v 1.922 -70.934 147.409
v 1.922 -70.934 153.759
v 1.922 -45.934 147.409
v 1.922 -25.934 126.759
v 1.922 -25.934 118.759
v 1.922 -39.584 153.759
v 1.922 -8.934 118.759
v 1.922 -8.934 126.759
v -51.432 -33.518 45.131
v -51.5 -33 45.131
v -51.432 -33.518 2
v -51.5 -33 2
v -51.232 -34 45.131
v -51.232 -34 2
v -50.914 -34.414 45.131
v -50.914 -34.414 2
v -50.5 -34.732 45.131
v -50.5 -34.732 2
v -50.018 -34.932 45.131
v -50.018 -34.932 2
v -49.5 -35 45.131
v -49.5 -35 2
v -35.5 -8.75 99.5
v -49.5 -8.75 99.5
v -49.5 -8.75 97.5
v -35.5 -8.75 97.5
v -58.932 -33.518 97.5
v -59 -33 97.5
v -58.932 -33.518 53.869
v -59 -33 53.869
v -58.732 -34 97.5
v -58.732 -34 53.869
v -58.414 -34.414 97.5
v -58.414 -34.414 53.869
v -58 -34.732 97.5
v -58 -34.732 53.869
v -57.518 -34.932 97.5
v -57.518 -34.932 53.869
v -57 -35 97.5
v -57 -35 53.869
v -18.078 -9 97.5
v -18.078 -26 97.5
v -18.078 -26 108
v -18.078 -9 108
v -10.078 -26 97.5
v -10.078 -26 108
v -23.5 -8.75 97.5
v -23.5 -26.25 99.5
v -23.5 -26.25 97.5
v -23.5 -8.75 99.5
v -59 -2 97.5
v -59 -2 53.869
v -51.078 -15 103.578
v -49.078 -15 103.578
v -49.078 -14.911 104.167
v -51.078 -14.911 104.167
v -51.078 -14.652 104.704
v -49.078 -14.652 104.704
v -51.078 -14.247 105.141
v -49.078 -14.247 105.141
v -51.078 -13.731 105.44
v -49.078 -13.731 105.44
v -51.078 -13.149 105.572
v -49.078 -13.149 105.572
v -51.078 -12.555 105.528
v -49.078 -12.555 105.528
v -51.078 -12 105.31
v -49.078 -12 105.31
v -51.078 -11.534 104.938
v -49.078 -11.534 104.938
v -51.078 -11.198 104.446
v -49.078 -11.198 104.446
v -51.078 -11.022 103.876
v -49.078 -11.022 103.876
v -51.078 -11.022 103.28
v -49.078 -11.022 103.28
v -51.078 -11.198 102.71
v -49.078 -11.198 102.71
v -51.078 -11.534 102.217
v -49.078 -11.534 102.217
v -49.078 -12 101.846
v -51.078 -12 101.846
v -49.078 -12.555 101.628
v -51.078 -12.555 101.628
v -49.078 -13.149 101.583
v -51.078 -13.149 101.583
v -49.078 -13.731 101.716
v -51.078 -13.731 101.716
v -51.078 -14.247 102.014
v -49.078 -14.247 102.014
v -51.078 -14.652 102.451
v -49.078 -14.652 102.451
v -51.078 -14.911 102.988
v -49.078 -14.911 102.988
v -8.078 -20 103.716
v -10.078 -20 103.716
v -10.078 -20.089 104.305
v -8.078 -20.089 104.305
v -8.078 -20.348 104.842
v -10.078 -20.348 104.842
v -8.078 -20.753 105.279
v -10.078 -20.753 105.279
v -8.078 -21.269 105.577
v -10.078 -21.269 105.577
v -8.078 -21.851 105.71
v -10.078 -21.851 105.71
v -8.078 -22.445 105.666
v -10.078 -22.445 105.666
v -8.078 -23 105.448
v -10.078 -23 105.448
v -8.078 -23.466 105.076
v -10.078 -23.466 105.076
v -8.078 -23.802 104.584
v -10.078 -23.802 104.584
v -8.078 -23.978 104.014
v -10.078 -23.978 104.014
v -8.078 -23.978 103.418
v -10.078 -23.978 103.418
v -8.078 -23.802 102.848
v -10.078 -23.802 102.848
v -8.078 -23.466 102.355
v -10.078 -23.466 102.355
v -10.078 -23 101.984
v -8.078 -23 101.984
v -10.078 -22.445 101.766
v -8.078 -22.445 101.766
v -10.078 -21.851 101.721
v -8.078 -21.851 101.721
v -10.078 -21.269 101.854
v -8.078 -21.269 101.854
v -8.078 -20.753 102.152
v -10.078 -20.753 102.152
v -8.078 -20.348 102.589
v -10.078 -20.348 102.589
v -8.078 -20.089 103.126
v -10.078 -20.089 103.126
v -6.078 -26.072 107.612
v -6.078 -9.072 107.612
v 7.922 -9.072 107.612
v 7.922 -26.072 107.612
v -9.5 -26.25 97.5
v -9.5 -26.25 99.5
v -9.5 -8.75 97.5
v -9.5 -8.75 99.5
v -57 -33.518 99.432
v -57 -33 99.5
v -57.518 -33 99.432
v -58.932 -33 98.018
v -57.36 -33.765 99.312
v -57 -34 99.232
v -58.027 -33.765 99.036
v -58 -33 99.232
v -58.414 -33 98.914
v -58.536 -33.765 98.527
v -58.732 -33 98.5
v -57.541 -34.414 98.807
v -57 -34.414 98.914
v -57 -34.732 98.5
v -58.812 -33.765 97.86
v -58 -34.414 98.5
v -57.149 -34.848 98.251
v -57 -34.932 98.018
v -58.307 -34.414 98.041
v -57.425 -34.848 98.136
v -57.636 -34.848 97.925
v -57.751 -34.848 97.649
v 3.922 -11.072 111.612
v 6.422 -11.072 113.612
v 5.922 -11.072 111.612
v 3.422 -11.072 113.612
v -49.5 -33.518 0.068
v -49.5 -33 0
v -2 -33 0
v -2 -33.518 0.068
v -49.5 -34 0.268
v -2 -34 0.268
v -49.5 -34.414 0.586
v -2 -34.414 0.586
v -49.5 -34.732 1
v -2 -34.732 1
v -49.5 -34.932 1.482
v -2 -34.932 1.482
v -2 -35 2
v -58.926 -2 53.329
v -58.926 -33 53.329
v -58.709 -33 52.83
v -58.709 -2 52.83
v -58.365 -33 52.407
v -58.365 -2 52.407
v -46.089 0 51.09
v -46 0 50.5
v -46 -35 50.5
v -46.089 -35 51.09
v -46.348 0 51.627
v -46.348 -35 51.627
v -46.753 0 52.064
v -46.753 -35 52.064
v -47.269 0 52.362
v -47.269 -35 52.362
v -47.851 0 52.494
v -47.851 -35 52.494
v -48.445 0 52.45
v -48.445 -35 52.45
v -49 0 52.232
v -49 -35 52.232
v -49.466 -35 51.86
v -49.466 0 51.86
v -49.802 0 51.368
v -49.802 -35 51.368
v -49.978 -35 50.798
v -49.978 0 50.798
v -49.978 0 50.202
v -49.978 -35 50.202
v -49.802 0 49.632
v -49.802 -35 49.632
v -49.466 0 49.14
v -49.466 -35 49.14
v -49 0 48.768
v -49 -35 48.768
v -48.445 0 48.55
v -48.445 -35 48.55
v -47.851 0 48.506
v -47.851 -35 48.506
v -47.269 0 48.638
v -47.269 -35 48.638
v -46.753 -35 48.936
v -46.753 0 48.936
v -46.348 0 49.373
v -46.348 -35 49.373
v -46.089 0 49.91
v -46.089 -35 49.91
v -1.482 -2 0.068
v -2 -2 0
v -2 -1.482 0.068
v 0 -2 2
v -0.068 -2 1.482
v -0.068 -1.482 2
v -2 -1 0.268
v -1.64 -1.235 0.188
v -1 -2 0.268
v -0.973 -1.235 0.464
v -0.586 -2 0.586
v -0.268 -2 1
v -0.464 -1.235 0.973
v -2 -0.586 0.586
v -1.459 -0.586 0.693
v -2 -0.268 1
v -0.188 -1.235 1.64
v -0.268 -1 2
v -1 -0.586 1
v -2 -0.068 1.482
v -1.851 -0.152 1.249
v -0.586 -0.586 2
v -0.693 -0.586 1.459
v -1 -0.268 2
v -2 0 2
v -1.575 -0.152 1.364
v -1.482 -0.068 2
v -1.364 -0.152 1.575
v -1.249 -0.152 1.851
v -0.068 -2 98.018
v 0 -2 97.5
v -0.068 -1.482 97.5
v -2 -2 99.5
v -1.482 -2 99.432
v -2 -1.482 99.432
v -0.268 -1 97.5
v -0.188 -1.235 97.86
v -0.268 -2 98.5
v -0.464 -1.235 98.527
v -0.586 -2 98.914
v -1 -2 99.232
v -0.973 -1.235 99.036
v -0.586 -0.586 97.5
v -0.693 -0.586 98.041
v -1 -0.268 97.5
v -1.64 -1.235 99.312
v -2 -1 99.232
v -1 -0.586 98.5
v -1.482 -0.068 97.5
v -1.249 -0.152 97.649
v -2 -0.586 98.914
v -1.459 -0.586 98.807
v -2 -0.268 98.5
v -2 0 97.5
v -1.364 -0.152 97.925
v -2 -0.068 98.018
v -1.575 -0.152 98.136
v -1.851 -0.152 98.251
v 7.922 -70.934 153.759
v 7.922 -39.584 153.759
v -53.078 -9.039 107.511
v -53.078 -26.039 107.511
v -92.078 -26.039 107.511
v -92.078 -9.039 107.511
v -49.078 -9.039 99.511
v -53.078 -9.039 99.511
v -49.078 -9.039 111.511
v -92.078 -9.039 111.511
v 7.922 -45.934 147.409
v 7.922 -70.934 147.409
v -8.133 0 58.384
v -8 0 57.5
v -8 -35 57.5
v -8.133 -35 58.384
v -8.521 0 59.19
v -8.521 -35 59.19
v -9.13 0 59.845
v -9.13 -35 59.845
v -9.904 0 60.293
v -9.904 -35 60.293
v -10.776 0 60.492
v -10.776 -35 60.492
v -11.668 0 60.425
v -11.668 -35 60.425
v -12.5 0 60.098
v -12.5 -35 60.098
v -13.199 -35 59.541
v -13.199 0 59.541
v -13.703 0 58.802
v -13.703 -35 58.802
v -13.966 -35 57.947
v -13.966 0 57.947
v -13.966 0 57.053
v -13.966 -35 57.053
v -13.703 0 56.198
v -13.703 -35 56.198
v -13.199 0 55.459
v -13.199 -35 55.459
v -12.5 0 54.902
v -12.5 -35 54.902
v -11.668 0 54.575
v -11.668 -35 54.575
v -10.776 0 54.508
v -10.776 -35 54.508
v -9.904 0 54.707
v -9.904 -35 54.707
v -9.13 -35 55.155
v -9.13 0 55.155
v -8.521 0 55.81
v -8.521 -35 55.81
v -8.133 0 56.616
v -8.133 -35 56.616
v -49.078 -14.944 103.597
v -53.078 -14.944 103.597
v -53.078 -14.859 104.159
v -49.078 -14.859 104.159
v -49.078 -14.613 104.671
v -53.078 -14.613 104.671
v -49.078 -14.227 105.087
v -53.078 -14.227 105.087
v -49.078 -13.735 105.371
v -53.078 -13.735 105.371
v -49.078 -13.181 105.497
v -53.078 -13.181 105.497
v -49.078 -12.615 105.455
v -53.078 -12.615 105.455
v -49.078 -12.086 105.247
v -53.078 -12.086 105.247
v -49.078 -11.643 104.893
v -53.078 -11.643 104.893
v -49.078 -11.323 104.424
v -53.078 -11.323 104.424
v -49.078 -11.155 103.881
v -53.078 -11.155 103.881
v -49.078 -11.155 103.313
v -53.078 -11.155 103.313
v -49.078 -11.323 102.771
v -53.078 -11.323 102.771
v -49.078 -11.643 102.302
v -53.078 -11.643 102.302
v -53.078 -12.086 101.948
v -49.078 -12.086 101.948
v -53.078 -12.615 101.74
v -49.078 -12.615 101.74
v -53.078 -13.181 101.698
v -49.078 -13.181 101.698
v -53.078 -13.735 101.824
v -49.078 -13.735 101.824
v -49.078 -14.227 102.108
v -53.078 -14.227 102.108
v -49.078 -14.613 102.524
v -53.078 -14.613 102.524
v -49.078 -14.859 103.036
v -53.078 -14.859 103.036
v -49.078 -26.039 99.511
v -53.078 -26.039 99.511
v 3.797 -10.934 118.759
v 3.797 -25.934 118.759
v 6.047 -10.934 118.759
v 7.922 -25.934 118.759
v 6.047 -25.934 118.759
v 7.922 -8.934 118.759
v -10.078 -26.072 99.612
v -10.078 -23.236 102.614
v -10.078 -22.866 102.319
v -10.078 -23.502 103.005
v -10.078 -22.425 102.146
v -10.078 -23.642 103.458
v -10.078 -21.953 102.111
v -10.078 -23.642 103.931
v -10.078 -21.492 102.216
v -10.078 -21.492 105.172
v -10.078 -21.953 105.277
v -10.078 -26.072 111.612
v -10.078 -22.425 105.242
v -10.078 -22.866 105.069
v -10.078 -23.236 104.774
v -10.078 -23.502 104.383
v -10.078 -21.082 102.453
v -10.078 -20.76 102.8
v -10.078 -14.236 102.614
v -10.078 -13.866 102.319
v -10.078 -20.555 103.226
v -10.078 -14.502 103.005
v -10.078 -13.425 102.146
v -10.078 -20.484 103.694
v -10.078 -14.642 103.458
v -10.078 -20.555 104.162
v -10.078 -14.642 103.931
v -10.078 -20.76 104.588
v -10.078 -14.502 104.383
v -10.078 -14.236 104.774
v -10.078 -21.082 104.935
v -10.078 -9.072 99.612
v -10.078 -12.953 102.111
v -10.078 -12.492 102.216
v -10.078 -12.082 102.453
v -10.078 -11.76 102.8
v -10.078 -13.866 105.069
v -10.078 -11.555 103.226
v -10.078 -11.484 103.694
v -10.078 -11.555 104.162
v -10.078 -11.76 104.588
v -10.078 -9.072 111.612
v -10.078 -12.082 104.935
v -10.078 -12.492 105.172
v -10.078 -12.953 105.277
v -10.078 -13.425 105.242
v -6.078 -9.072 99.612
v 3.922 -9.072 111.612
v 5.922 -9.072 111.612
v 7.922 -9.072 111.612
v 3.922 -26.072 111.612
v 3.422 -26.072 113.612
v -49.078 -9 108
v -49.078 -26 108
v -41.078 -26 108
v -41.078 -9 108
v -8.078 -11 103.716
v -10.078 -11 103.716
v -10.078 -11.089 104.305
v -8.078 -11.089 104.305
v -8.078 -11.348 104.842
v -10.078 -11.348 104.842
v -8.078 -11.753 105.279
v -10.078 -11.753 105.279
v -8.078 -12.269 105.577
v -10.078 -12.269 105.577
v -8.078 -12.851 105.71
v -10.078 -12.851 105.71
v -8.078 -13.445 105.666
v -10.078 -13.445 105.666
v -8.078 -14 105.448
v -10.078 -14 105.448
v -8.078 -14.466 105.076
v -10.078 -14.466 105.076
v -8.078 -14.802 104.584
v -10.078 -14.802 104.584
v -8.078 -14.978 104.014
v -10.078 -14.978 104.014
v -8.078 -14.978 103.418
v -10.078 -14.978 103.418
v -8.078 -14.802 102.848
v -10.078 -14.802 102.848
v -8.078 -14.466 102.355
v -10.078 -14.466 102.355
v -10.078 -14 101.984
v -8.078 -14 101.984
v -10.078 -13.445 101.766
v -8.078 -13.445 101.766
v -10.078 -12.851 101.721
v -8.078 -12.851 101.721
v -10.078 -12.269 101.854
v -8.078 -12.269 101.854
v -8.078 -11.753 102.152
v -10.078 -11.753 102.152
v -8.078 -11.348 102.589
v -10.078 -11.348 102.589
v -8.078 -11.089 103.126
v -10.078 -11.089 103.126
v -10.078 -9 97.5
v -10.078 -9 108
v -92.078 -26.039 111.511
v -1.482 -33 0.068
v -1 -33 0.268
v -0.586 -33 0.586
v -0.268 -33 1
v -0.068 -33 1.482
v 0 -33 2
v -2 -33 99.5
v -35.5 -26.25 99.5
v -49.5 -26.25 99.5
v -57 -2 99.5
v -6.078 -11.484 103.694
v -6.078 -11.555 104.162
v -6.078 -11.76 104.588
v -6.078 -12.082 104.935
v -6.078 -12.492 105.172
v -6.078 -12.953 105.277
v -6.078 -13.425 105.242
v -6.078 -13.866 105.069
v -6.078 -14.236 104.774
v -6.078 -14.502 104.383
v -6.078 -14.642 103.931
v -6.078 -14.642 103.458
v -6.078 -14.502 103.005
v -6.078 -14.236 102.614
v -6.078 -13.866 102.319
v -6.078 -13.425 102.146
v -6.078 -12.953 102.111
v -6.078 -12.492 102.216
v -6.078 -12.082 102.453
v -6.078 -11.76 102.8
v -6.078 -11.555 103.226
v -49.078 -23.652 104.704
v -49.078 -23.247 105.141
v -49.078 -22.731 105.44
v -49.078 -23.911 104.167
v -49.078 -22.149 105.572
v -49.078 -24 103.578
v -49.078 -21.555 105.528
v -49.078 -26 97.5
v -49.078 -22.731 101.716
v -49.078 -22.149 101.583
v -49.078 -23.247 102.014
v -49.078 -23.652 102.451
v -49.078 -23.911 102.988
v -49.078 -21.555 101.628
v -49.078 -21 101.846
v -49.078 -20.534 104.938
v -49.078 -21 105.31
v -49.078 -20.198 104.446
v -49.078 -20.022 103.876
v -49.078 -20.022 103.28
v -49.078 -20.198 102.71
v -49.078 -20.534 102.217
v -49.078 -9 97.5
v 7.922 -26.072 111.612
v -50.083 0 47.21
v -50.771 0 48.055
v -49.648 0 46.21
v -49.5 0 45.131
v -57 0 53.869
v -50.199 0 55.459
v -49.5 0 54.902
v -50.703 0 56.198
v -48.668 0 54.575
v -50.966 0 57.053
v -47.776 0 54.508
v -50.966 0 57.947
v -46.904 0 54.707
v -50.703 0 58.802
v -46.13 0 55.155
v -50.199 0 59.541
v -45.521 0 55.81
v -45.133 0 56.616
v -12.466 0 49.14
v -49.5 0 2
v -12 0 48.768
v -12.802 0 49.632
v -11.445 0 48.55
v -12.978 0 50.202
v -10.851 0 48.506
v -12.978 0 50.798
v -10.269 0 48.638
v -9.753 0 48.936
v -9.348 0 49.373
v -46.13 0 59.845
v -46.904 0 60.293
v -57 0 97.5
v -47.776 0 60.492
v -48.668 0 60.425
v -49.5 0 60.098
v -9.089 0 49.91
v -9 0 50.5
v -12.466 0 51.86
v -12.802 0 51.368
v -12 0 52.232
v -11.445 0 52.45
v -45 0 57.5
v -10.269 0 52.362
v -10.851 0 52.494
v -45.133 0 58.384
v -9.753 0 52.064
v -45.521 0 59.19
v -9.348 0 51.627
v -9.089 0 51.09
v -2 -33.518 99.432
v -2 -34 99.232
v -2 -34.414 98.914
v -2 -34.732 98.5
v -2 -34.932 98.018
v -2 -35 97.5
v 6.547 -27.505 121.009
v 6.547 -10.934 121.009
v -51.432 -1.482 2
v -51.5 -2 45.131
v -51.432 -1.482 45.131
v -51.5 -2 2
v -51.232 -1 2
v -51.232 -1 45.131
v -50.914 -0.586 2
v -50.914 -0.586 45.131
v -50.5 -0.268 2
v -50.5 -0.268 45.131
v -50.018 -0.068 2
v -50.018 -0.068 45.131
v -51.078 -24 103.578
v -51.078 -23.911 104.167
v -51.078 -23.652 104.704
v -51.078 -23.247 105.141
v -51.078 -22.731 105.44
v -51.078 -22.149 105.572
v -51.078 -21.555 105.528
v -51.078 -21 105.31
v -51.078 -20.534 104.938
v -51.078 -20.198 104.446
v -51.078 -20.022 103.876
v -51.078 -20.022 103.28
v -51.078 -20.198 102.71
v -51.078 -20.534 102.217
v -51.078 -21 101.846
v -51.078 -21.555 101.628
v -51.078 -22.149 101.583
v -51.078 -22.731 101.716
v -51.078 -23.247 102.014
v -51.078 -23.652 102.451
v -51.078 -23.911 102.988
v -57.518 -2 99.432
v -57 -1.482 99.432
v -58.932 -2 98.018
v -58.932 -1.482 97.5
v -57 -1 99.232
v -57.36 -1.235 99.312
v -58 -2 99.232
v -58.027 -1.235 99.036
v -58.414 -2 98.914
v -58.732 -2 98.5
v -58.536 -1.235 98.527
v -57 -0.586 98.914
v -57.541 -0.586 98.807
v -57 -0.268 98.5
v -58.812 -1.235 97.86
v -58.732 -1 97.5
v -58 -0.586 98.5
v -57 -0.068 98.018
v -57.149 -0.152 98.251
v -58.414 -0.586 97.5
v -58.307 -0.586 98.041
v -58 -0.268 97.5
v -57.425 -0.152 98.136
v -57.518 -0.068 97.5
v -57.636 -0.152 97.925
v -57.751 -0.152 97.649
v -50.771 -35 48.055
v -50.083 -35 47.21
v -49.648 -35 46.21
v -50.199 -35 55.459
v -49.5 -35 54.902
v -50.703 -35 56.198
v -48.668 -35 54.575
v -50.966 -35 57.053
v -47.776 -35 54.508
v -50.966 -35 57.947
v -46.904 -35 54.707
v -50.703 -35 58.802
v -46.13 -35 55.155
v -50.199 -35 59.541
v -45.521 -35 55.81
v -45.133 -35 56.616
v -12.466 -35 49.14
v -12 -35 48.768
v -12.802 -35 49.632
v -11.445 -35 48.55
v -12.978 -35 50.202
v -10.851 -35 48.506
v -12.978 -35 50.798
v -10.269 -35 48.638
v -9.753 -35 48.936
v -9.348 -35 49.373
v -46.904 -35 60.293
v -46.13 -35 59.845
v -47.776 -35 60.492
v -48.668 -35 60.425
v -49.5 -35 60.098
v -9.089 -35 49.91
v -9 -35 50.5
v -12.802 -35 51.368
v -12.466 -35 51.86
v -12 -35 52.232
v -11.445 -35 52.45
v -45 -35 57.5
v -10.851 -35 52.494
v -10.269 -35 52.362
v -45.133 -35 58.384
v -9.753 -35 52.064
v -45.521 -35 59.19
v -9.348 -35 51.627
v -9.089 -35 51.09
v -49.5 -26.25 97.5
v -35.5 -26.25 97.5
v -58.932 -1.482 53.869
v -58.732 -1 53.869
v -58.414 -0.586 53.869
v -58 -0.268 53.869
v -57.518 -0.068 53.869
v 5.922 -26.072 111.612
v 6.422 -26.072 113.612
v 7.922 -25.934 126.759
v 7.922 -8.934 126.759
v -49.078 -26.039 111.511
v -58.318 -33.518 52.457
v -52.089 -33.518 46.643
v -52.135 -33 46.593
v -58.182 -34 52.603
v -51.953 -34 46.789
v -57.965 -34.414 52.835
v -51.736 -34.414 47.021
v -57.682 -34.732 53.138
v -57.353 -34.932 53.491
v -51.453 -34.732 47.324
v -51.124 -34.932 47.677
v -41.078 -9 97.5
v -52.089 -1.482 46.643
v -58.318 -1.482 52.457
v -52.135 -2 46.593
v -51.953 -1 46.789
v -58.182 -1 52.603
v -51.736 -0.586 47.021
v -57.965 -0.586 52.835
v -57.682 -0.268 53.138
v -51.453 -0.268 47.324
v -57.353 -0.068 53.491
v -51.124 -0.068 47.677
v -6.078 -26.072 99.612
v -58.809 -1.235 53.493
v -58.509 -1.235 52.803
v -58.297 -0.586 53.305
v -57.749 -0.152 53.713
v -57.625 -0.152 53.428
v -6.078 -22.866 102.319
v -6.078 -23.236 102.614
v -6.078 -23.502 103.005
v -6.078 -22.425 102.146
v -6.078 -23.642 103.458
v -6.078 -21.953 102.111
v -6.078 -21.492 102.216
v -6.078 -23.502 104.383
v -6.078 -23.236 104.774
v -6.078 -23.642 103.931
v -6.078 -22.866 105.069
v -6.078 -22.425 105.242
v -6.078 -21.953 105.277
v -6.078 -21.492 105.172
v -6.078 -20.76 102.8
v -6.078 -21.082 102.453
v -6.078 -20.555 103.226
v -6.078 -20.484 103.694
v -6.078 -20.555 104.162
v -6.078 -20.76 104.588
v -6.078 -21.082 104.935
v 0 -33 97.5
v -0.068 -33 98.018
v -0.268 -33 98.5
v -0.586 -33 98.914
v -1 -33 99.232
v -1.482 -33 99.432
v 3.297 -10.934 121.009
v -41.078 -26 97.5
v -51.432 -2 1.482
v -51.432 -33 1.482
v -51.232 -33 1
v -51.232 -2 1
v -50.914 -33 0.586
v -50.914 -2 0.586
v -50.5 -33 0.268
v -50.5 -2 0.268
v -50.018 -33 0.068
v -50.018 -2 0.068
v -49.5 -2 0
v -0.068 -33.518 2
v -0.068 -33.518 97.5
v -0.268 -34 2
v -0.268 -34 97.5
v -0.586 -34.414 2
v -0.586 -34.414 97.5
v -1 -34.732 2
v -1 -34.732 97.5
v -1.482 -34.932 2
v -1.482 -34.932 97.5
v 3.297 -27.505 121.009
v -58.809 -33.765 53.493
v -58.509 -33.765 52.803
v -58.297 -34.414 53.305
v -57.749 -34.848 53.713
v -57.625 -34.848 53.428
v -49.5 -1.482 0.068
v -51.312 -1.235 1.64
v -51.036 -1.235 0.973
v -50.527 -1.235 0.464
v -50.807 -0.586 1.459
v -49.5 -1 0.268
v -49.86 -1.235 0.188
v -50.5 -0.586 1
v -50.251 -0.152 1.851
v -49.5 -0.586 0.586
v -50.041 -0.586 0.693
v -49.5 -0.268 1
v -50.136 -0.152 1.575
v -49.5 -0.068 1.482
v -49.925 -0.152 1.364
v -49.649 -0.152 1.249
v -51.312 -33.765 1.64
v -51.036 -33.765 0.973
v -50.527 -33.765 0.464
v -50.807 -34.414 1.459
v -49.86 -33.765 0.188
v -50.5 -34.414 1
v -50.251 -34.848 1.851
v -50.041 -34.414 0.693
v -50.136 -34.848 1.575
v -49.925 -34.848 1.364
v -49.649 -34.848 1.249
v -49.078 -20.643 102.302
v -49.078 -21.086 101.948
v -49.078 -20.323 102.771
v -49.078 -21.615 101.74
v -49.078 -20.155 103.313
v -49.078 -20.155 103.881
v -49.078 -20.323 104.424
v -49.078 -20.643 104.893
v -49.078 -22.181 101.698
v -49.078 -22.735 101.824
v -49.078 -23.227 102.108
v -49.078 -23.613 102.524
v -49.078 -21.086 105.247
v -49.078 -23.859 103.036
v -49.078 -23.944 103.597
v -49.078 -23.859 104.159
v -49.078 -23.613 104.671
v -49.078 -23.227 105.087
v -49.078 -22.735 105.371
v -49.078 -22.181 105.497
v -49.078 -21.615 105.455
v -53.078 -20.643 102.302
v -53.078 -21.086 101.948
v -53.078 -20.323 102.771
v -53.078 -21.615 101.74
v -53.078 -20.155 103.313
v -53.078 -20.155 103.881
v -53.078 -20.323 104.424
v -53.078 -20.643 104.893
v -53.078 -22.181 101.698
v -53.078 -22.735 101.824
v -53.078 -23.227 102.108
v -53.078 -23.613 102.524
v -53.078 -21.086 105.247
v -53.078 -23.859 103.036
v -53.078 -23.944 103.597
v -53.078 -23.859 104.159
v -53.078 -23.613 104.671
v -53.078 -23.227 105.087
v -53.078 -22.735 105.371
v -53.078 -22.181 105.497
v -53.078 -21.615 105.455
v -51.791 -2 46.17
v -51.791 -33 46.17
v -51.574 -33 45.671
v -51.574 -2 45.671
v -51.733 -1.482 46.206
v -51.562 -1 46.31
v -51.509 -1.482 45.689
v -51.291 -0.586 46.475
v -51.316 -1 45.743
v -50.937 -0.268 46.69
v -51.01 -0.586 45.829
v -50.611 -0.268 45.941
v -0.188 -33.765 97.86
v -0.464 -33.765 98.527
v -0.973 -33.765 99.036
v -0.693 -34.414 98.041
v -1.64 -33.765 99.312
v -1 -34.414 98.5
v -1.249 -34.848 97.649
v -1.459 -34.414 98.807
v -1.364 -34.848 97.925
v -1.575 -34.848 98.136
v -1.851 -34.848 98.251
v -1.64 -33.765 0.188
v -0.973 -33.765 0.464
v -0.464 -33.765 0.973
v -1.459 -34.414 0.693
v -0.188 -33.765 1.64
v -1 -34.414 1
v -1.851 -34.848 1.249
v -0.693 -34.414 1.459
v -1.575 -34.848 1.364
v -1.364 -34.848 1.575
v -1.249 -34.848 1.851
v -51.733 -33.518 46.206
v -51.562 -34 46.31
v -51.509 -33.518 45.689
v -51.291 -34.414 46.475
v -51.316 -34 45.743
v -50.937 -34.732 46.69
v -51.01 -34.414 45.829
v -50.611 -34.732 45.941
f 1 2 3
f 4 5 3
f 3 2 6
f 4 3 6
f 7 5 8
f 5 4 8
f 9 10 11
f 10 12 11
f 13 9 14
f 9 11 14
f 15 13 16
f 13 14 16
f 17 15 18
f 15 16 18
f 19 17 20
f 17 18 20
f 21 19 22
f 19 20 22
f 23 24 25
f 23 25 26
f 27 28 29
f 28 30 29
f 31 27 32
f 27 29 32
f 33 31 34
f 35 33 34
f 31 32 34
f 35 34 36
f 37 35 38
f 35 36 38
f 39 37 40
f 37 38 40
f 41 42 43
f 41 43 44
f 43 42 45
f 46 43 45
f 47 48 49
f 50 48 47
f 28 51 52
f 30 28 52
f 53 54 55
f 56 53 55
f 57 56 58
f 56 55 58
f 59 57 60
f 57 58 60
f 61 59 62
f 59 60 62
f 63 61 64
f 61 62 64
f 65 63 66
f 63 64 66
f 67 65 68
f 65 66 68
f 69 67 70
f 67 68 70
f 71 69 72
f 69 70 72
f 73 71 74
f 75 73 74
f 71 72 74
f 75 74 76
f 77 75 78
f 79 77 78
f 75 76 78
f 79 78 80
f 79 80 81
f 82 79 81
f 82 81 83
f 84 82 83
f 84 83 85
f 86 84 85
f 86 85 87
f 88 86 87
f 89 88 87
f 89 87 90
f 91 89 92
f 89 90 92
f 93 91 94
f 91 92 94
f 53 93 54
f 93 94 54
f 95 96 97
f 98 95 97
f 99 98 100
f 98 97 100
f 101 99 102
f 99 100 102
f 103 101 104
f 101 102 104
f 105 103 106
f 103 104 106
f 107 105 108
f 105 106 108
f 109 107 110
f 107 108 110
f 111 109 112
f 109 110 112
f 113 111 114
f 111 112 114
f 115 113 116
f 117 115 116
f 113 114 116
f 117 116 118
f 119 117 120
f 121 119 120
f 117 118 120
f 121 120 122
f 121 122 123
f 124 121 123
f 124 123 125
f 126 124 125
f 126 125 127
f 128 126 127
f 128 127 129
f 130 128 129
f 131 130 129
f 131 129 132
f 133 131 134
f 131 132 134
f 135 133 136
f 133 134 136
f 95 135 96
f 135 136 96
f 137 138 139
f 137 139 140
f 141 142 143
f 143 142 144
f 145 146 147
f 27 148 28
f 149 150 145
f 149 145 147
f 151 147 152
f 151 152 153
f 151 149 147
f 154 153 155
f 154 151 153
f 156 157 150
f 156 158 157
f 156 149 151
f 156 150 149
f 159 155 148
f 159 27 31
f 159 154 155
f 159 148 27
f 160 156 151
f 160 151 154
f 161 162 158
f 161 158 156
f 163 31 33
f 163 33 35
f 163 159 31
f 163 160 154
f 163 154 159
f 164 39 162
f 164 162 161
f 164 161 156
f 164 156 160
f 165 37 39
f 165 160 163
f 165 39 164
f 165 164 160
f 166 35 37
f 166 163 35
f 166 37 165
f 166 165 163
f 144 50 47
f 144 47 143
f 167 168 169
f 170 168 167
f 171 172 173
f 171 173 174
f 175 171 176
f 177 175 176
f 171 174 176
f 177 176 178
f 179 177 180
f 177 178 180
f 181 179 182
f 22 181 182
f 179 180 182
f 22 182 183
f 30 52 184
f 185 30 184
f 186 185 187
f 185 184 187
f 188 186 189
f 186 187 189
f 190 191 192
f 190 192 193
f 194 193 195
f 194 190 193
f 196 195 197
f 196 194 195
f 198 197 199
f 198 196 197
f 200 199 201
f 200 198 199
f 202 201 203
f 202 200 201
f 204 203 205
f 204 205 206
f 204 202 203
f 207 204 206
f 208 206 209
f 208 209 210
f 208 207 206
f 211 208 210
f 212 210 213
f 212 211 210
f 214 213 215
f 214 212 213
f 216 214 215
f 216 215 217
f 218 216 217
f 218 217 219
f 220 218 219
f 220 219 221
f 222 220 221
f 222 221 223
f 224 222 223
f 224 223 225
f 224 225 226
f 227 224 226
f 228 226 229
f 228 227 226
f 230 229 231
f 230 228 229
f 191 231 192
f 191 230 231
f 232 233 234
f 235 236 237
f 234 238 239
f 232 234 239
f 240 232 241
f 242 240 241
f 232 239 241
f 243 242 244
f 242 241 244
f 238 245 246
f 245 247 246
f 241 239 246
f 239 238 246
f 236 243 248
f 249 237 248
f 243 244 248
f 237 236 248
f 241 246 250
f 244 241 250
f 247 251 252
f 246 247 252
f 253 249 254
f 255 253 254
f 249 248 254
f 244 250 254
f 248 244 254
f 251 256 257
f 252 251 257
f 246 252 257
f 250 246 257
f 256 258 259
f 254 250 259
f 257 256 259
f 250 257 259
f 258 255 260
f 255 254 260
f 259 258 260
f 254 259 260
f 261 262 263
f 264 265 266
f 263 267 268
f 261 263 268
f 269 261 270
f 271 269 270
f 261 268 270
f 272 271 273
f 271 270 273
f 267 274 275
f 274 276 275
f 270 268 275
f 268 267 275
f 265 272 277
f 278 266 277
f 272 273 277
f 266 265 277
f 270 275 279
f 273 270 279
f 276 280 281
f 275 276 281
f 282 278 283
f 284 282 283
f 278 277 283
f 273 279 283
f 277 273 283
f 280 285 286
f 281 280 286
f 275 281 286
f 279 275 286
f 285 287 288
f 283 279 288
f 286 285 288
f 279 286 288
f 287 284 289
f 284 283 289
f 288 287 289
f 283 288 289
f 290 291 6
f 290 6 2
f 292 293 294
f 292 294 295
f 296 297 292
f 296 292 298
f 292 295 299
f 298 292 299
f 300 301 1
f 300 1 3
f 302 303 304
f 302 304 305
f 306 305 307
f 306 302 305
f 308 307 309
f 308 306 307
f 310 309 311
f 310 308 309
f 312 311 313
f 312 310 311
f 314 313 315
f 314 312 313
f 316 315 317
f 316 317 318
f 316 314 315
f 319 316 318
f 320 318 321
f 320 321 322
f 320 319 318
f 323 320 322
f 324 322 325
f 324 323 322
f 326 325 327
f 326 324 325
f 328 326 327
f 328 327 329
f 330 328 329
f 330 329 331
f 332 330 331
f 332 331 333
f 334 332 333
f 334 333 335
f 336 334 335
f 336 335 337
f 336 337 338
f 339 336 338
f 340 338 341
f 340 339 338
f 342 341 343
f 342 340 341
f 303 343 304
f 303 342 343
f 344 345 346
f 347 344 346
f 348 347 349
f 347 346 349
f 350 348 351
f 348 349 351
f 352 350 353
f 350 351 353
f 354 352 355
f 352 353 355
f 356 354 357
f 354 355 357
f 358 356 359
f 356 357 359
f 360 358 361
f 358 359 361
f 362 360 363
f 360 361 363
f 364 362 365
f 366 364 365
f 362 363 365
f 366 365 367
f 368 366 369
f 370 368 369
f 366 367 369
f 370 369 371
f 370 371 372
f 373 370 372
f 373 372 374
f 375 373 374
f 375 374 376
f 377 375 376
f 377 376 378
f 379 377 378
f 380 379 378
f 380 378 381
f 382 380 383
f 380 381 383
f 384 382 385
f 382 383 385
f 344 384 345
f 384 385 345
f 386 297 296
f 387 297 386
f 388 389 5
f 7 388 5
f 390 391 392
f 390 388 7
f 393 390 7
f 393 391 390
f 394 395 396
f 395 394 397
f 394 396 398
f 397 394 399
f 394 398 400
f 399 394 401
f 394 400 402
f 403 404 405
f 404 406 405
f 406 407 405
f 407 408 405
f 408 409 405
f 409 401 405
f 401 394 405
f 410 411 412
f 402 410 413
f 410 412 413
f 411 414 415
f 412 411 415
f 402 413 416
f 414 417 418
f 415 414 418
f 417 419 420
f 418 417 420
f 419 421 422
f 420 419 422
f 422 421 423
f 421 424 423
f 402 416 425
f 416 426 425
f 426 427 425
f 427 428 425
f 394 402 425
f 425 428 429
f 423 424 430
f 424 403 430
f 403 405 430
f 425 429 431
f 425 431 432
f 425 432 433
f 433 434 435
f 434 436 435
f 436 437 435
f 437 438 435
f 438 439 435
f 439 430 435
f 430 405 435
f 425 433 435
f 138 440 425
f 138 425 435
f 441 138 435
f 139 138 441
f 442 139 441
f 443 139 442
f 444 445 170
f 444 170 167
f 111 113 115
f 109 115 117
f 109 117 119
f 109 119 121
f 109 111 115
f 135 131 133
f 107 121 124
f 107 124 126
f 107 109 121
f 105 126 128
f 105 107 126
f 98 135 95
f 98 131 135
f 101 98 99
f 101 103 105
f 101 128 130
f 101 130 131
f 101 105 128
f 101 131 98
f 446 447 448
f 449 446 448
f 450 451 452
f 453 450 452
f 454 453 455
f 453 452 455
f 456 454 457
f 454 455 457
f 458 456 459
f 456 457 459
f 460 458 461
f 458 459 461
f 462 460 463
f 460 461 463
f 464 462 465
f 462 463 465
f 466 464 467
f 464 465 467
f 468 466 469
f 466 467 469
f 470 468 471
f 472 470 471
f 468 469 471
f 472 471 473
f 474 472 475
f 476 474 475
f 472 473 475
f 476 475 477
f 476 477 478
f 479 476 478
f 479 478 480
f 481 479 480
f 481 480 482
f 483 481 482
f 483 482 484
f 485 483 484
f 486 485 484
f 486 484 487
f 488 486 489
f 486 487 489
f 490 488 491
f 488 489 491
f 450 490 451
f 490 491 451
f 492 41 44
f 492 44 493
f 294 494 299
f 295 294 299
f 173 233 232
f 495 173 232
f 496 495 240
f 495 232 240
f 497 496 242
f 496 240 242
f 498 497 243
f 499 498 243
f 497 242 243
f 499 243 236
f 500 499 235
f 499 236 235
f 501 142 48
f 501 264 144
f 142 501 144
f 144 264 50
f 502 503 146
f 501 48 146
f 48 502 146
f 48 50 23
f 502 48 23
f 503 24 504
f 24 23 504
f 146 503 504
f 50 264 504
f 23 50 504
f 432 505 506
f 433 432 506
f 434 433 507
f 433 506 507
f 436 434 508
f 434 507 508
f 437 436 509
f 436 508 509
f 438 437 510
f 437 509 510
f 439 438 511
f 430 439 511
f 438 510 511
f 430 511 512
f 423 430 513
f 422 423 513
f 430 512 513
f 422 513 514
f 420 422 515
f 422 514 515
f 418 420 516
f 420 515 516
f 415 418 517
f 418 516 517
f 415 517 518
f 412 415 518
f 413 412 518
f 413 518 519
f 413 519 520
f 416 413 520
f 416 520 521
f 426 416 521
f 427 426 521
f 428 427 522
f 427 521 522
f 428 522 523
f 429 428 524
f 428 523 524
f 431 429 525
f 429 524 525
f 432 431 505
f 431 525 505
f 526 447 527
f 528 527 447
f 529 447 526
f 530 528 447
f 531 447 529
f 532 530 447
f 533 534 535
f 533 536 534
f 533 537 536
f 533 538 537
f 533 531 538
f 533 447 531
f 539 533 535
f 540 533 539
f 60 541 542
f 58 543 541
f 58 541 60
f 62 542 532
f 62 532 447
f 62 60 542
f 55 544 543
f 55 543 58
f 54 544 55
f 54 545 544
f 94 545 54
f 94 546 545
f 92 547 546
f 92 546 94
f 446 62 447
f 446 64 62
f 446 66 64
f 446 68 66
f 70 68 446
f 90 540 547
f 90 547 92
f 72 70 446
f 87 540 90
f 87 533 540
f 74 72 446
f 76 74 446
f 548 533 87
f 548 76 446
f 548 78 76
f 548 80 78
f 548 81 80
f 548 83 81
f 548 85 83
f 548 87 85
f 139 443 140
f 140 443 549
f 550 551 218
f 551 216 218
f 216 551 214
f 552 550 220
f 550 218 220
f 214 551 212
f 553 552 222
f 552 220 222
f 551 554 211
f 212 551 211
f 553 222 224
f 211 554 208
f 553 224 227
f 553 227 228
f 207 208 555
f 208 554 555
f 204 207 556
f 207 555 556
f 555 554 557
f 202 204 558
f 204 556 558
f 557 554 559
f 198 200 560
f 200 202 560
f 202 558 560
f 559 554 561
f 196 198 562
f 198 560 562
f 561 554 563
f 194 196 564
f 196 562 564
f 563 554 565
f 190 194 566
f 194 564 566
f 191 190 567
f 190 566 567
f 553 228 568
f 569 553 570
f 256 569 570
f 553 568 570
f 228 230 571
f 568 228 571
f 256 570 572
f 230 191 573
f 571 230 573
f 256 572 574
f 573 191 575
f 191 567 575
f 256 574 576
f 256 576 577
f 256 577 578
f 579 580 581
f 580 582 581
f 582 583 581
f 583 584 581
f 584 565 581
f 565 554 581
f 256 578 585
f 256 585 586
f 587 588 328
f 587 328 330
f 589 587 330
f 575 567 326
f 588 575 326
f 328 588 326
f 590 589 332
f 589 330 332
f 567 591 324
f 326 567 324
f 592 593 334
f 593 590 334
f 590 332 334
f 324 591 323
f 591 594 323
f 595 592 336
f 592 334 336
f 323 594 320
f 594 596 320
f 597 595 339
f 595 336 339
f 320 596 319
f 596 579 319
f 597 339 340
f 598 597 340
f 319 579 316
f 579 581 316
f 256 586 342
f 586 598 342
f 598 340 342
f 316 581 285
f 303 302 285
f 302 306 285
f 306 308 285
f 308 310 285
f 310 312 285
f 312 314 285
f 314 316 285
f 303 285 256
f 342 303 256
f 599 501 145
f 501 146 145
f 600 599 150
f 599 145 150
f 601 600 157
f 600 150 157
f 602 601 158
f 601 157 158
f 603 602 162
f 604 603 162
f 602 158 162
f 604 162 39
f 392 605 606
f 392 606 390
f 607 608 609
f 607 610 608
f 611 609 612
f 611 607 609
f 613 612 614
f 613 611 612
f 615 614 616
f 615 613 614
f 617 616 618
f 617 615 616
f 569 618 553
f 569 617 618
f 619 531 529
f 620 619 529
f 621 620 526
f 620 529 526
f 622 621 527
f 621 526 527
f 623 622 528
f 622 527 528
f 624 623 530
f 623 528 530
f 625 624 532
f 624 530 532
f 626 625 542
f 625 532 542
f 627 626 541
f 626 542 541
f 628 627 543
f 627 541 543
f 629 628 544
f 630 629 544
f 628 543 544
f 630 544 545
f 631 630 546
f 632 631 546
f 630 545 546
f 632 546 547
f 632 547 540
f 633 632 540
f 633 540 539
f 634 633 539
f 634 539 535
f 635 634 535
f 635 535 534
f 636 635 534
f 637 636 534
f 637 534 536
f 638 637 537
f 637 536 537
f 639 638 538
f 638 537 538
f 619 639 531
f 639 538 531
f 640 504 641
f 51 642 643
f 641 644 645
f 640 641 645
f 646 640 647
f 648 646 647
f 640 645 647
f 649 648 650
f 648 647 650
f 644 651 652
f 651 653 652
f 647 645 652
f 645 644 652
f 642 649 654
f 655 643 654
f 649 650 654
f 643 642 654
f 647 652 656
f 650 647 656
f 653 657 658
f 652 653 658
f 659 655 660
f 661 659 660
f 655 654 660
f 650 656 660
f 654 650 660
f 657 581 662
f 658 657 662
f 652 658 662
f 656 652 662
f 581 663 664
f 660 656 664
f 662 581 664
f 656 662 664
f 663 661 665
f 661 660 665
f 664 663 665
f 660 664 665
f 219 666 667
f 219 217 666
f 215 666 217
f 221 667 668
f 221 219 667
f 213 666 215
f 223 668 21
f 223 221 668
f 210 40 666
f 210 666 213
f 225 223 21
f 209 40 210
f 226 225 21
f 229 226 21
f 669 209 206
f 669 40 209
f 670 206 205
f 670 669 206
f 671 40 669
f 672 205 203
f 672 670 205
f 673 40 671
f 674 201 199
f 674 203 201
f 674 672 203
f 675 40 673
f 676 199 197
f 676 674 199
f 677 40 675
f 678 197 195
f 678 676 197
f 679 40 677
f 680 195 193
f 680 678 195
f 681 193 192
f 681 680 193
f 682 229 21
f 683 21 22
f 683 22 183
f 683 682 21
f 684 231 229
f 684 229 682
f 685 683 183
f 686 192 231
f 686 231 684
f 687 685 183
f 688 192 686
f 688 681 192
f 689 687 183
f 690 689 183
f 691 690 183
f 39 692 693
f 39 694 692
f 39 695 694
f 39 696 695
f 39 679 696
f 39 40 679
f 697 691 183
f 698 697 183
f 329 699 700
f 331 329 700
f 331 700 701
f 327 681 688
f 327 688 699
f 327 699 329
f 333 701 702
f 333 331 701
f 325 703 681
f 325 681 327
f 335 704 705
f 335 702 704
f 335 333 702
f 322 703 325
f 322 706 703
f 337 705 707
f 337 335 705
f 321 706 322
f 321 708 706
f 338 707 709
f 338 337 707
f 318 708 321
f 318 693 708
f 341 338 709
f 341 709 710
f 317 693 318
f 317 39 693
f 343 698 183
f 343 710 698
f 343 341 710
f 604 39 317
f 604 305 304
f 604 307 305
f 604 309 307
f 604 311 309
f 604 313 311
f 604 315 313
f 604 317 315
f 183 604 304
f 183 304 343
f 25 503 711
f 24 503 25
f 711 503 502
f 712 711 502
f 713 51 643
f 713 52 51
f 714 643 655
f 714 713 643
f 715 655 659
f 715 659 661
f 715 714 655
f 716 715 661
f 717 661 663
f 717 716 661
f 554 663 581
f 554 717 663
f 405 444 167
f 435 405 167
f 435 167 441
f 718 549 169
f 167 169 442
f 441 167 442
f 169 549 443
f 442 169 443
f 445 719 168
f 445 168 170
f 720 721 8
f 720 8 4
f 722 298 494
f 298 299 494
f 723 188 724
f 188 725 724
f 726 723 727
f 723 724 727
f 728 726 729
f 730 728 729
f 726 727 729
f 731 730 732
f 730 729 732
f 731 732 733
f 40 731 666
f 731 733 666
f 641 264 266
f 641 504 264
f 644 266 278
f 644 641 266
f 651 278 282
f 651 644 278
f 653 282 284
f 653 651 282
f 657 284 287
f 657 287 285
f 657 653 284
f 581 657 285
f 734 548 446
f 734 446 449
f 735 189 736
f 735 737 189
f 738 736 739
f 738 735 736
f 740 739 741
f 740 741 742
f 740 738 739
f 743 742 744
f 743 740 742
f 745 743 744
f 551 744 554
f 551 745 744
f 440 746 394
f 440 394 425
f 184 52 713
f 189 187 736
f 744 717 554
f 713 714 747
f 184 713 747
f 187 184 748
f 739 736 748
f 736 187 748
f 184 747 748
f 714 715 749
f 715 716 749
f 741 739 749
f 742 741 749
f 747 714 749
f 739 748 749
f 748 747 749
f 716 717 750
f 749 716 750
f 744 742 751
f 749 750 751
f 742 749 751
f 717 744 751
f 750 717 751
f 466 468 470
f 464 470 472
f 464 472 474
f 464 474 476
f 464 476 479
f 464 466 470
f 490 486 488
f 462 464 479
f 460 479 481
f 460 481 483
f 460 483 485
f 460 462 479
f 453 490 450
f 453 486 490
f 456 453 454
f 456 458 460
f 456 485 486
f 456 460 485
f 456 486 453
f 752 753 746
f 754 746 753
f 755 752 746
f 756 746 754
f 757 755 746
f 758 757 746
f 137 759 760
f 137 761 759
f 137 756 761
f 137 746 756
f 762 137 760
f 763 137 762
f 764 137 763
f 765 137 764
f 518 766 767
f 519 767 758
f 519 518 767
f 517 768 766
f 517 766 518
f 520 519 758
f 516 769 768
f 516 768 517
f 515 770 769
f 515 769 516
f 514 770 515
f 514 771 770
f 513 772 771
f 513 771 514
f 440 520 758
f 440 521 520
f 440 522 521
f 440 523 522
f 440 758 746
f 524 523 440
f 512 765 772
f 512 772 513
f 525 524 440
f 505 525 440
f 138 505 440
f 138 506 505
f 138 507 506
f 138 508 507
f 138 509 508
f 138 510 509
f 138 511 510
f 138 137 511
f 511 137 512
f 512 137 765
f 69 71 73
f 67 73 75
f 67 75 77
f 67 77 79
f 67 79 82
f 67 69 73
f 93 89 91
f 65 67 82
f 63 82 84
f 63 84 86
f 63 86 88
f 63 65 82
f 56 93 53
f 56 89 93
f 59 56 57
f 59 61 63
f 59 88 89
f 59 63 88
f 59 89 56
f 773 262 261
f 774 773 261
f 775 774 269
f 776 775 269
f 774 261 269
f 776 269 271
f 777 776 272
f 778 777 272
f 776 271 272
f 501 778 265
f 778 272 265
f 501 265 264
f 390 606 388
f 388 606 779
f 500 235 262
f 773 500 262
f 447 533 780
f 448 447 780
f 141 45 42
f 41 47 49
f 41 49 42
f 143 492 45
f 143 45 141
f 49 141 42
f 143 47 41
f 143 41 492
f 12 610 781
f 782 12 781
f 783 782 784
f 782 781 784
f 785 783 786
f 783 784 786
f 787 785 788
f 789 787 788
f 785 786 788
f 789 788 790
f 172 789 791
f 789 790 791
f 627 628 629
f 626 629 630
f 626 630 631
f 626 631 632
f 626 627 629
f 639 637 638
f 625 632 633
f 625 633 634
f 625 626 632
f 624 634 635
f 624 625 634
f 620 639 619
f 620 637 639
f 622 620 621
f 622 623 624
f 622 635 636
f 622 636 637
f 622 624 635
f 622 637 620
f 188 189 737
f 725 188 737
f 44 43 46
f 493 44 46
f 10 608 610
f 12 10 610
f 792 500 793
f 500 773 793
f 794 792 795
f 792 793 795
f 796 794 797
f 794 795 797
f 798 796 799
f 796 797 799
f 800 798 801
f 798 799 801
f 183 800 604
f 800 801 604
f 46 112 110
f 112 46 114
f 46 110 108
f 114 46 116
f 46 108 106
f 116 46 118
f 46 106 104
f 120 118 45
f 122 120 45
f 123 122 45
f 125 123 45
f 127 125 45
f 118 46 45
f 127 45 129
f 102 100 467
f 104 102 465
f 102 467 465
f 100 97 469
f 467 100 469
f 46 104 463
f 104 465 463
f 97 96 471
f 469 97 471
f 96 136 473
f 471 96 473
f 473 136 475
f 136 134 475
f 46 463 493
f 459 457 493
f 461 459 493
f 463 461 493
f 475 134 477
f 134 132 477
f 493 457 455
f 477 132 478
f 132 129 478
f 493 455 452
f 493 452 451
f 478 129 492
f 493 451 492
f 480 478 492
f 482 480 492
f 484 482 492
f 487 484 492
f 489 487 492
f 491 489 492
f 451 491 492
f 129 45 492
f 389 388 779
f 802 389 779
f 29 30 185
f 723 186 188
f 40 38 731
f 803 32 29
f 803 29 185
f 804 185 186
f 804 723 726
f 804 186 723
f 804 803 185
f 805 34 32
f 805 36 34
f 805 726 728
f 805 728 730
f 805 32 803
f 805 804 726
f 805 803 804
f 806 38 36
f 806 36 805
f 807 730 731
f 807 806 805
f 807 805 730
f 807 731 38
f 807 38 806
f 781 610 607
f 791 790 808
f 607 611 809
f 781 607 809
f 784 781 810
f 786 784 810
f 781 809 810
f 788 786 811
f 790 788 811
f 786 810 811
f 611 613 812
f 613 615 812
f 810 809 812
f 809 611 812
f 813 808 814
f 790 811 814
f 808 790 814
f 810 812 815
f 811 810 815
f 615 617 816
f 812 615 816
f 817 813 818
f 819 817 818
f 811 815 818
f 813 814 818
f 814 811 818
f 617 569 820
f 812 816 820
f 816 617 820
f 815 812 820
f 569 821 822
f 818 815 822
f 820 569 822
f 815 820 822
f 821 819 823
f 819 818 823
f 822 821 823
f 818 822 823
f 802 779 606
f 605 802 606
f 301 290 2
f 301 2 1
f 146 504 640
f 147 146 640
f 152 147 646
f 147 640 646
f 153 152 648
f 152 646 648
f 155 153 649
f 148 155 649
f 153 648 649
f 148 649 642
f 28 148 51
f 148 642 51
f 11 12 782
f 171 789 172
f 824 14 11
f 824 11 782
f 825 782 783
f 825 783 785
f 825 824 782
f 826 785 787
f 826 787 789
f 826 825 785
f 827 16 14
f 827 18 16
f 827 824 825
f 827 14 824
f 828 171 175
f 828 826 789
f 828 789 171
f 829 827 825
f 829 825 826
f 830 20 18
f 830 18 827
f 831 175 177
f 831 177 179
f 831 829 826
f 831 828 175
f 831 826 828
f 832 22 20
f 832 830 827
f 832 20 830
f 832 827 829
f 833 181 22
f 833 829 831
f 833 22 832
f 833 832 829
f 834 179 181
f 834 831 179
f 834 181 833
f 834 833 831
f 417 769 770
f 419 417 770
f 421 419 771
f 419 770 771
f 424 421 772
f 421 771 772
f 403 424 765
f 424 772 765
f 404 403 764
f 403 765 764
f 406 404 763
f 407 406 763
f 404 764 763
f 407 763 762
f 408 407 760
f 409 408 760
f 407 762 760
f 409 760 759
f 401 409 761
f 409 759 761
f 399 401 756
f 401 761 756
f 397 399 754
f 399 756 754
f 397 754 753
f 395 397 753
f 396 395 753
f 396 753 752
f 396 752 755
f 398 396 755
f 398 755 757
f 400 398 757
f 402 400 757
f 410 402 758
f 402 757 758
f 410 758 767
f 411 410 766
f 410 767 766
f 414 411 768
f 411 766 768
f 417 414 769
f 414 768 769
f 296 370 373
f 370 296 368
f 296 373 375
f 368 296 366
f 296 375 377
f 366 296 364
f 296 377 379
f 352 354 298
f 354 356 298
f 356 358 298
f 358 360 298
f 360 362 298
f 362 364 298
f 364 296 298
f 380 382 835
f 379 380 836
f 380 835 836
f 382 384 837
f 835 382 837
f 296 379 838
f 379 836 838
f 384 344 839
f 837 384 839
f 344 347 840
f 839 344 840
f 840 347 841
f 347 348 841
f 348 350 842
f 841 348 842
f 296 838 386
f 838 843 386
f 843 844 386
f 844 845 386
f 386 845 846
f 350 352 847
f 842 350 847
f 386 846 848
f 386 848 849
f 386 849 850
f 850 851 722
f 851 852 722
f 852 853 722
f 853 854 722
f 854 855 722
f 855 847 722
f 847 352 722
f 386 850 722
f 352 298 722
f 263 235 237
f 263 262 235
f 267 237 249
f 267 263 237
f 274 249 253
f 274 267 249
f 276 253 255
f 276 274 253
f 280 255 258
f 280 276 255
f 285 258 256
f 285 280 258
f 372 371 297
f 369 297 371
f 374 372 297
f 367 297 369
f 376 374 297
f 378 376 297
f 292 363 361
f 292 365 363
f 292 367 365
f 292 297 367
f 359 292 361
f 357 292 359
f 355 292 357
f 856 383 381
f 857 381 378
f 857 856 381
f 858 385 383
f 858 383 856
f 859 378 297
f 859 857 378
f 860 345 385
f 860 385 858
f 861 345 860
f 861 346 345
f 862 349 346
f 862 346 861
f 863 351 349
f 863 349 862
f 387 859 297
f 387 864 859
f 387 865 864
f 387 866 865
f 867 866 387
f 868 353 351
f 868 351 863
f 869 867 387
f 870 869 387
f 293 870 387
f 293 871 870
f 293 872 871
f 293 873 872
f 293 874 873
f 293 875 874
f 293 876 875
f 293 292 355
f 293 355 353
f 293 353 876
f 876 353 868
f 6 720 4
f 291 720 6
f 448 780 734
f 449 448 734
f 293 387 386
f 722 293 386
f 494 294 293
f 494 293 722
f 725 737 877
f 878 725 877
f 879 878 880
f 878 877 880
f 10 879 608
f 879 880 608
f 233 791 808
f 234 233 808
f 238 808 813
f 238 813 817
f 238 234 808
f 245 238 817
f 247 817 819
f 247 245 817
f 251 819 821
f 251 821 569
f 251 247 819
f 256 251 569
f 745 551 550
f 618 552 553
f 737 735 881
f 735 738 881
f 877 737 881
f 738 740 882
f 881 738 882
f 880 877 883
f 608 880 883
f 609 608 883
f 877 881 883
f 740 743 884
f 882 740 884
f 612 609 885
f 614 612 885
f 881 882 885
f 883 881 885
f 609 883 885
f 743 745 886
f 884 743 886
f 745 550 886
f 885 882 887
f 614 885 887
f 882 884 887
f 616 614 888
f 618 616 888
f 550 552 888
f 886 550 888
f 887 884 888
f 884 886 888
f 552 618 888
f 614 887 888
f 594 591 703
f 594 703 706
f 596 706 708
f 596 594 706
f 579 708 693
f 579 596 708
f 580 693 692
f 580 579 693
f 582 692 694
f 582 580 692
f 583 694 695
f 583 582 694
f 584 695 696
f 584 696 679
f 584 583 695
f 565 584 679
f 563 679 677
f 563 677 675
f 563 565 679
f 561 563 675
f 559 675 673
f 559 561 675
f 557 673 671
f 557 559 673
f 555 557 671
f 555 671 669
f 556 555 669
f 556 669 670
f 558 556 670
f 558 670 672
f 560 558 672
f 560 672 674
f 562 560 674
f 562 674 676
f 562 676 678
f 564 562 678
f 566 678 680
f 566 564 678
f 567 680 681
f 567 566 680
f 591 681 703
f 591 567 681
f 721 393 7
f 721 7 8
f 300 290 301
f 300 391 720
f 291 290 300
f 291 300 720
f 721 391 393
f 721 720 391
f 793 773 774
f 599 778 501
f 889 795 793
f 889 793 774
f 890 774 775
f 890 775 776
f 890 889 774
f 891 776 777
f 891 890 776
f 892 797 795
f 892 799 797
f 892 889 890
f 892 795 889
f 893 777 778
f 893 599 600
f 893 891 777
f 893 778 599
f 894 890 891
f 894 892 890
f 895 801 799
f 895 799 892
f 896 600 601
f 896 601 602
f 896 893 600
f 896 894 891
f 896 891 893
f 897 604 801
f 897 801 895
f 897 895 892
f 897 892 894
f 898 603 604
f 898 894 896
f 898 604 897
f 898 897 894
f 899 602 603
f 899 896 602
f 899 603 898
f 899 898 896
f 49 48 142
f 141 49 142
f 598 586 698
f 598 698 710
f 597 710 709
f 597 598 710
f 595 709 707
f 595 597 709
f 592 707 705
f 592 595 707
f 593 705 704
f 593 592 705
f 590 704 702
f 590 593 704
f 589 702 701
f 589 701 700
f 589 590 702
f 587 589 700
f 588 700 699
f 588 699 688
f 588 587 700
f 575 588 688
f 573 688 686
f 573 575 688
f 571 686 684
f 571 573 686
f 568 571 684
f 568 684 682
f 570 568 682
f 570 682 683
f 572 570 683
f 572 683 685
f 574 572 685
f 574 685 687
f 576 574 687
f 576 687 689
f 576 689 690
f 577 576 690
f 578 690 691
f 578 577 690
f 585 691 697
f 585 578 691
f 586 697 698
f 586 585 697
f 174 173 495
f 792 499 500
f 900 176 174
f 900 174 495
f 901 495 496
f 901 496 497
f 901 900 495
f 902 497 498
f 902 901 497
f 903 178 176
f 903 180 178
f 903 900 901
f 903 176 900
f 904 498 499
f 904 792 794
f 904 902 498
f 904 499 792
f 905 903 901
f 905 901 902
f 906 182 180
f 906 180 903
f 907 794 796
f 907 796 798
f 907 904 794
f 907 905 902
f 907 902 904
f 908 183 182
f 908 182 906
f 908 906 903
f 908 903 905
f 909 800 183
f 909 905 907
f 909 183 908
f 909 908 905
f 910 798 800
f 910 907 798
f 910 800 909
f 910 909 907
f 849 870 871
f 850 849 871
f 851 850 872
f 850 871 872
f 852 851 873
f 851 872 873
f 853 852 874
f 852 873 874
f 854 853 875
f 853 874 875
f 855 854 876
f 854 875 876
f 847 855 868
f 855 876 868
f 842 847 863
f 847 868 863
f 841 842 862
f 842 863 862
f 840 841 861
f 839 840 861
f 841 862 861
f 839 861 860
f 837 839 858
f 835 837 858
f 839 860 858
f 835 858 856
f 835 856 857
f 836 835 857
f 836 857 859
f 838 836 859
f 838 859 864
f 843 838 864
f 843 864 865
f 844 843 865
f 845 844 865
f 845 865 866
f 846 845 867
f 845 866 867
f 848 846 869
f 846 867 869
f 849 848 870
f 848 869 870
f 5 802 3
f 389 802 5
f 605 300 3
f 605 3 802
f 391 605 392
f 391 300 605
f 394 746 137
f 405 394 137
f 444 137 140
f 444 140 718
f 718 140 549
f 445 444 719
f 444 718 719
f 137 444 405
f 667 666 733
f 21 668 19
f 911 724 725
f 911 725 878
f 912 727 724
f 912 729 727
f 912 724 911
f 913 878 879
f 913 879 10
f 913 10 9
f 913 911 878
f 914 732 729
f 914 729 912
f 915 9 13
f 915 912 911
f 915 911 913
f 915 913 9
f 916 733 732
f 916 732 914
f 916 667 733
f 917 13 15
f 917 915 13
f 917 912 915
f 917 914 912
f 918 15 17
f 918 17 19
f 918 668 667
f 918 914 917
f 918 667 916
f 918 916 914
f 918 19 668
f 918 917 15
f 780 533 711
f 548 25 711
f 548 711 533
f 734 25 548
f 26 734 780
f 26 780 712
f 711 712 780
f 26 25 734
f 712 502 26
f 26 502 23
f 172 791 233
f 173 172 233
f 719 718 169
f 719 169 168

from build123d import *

# Parameters (mm, degrees)
F0_R      = 2
F0_R_2    = 3
F1_DEPTH  = 35
F2_R      = 2
F3_W      = 14
F3_H      = 17.5
F4_DEPTH  = 2
F5_W      = 8
F5_H      = 17
F6_DEPTH  = 10.5
F7_R      = 2
F8_DEPTH  = 2
F9_R      = 2
F10_DEPTH = 2
F12_W     = 17
F12_H     = 12
F12_R     = 1.5875
F13_DEPTH = 4
F14_W     = 17
F14_H     = 4
F15_DEPTH = 18
F17_W     = 17
F17_H     = 12
F17_R     = 1.905
F18_DEPTH = 4
F19_W     = 17
F19_H     = 4
F20_DEPTH = 43
F22_DEPTH = 17
F25_DEPTH = 6
F27_DEPTH = 62.001
F28_W     = 6
F28_H     = 8
F29_DEPTH = 2
F30_W     = 6.4162167525
F30_H     = 2.4192359447
F31_DEPTH = 2


with BuildPart() as f1:
    # F0 (on Front) → F1 (new body)
    with BuildSketch(Plane.XZ):
        with BuildLine():
            ThreePointArc((-2, 0), (-0.5857864376, 0.5857864376), (0, 2))
            Line((0, 2), (0, 97.5))
            ThreePointArc((0, 97.5), (-0.5857864376, 98.9142135624), (-2, 99.5))
            Line((-2, 99.5), (-57, 99.5))
            ThreePointArc((-57, 99.5), (-58.4142135624, 98.9142135624), (-59, 97.5))
            Line((-59, 97.5), (-59, 53.8691046038))
            ThreePointArc((-59, 53.8691046038), (-58.8342945512, 53.0720076842), (-58.3646365007, 52.4069940673))
            Line((-58.3646365007, 52.4069940673), (-52.1353634993, 46.5930059327))
            ThreePointArc((-52.1353634993, 46.5930059327), (-51.6657054488, 45.9279923158), (-51.5, 45.1308953962))
            Line((-51.5, 45.1308953962), (-51.5, 2))
            ThreePointArc((-51.5, 2), (-50.9142135624, 0.5857864376), (-49.5, 0))
            Line((-49.5, 0), (-2, 0))
        make_face()
        with Locations((-48, 50.5)):
            Circle(F0_R, mode=Mode.SUBTRACT)
        with Locations((-48, 57.5)):
            Circle(F0_R_2, mode=Mode.SUBTRACT)
        with Locations((-11, 50.5)):
            Circle(F0_R, mode=Mode.SUBTRACT)
        with Locations((-11, 57.5)):
            Circle(F0_R_2, mode=Mode.SUBTRACT)
    extrude(amount=F1_DEPTH)

    # F2
    f2_edges = [f1.edges().sort_by_distance(p)[0] for p in [
        (0, 0, 49.75),
        (-29.5, -35, 99.5),
        (-51.665705, 0, 45.927992),
        (-51.665705, -35, 45.927992),
        (-51.5, 0, 23.565448),
        (-51.5, -35, 23.565448),
        (-50.914214, 0, 0.585786),
        (-50.914214, -35, 0.585786),
        (-25.75, 0, 0),
        (-25.75, -35, 0),
        (-0.585786, 0, 0.585786),
        (-0.585786, -35, 0.585786),
        (0, -35, 49.75),
        (-0.585786, 0, 98.914214),
        (-0.585786, -35, 98.914214),
        (-29.5, 0, 99.5),
        (-58.414214, 0, 98.914214),
        (-58.414214, -35, 98.914214),
        (-59, 0, 75.684552),
        (-59, -35, 75.684552),
        (-58.834295, 0, 53.072008),
        (-58.834295, -35, 53.072008),
        (-55.25, 0, 49.5),
        (-55.25, -35, 49.5),
    ]]
    fillet(f2_edges, radius=F2_R)

    # F3 (on face) → F4 (cut)
    with BuildSketch(Plane.XY.offset(99.5)):
        with Locations((-42.5, -17.5)):
            Rectangle(F3_W, F3_H)
        with Locations((-16.5, -17.5)):
            Rectangle(F3_W, F3_H)
    extrude(amount=-F4_DEPTH, mode=Mode.SUBTRACT)

    # F5 (on face) → F6 (join)
    with BuildSketch(Plane.XY.offset(97.5)):
        with Locations((-45.0781651735, -17.5)):
            Rectangle(F5_W, F5_H)
        with Locations((-14.0781651735, -17.5)):
            Rectangle(F5_W, F5_H)
    extrude(amount=F6_DEPTH)

    # F7 (on face) → F8 (join)
    with BuildSketch(Plane(origin=(-49.0781651735, 0, 0), x_dir=(0, -1, 0), z_dir=(-1, 0, 0))):
        with Locations((13, 103.5777926445)):
            Circle(F7_R)
        with Locations((22, 103.5777926445)):
            Circle(F7_R)
    extrude(amount=F8_DEPTH)

    # F9 (on face) → F10 (join)
    with BuildSketch(Plane.YZ.offset(-10.0781651735)):
        with Locations((-22, 103.7157326937)):
            Circle(F9_R)
        with Locations((-13, 103.7157326937)):
            Circle(F9_R)
    extrude(amount=F10_DEPTH)


with BuildPart() as f13:
    # F12 (on offset) → F13 (new body)
    with BuildSketch(Plane.YZ.offset(-6.0781651735)):
        with Locations((-17.5719340369, 105.6120348573)):
            Rectangle(F12_W, F12_H)
        with Locations((-22.0719340369, 103.6941558123)):
            Circle(F12_R, mode=Mode.SUBTRACT)
        with Locations((-13.0719340369, 103.6941558123)):
            Circle(F12_R, mode=Mode.SUBTRACT)
    extrude(amount=-F13_DEPTH)

    # F14 (on face) → F15 (join)
    with BuildSketch(Plane(origin=(-10.0781651735, 0, 0), x_dir=(0, -1, 0), z_dir=(-1, 0, 0))):
        with Locations((17.5719340369, 109.6120348573)):
            Rectangle(F14_W, F14_H)
    extrude(amount=-F15_DEPTH)

    # F21 (on face) → F22 (join, through all)
    with BuildSketch(Plane.XZ.offset(26.0719340369)):
        Polygon((3.4218348265, 113.6120348573), (3.9218348265, 111.6120348573), (5.9218348265, 111.6120348573), (6.4218348265, 113.6120348573), align=None)
    extrude(amount=-F22_DEPTH)

    # F30 (on face) → F31 (cut)
    with BuildSketch(Plane(origin=(0, -9.0719340369, 0), x_dir=(-1, 0, 0), z_dir=(0, 1, 0))):
        with Locations((-4.7137264502, 112.8216528296)):
            Rectangle(F30_W, F30_H)
    extrude(amount=-F31_DEPTH, mode=Mode.SUBTRACT)


with BuildPart() as f18:
    # F17 (on offset) → F18 (new body)
    with BuildSketch(Plane(origin=(-53.0781651735, 0, 0), x_dir=(0, -1, 0), z_dir=(-1, 0, 0))):
        with Locations((17.5389906317, 105.5109703541)):
            Rectangle(F17_W, F17_H)
        with Locations((13.0389906317, 103.5974174738)):
            Circle(F17_R, mode=Mode.SUBTRACT)
        with Locations((22.0389906317, 103.5974174738)):
            Circle(F17_R, mode=Mode.SUBTRACT)
    extrude(amount=-F18_DEPTH)

    # F19 (on face) → F20 (join)
    with BuildSketch(Plane.YZ.offset(-49.0781651735)):
        with Locations((-17.5389906317, 109.5109703541)):
            Rectangle(F19_W, F19_H)
    extrude(amount=-F20_DEPTH)


with BuildPart() as f25:
    # F24 (on offset) → F25 (new body)
    with BuildSketch(Plane.YZ.offset(7.9218348265)):
        Polygon((-45.9342463762, 147.4091031194), (-25.9342463762, 118.7591031194), (-8.9342463762, 118.7591031194), (-8.9342463762, 126.7591031194), (-25.9342463762, 126.7591031194), (-39.5842463762, 153.7591031194), (-70.9342463762, 153.7591031194), (-70.9342463762, 147.4091031194), align=None)
    extrude(amount=-F25_DEPTH)

    # F26 (on face) → F27 (cut, through all)
    with BuildSketch(Plane(origin=(0, -8.9342463762, 0), x_dir=(-1, 0, 0), z_dir=(0, 1, 0))):
        Polygon((-6.5468348265, 121.0091031194), (-6.0468348265, 118.7591031194), (-3.7968348265, 118.7591031194), (-3.2968348265, 121.0091031194), align=None)
    extrude(amount=-F27_DEPTH, mode=Mode.SUBTRACT)

    # F28 (on face) → F29 (join)
    with BuildSketch(Plane(origin=(0, -8.9342463762, 0), x_dir=(-1, 0, 0), z_dir=(0, 1, 0))):
        with Locations((-4.9218348265, 122.7591031194)):
            Rectangle(F28_W, F28_H)
    extrude(amount=-F29_DEPTH)


solid = Compound([f1.part, f13.part, f18.part, f25.part])
